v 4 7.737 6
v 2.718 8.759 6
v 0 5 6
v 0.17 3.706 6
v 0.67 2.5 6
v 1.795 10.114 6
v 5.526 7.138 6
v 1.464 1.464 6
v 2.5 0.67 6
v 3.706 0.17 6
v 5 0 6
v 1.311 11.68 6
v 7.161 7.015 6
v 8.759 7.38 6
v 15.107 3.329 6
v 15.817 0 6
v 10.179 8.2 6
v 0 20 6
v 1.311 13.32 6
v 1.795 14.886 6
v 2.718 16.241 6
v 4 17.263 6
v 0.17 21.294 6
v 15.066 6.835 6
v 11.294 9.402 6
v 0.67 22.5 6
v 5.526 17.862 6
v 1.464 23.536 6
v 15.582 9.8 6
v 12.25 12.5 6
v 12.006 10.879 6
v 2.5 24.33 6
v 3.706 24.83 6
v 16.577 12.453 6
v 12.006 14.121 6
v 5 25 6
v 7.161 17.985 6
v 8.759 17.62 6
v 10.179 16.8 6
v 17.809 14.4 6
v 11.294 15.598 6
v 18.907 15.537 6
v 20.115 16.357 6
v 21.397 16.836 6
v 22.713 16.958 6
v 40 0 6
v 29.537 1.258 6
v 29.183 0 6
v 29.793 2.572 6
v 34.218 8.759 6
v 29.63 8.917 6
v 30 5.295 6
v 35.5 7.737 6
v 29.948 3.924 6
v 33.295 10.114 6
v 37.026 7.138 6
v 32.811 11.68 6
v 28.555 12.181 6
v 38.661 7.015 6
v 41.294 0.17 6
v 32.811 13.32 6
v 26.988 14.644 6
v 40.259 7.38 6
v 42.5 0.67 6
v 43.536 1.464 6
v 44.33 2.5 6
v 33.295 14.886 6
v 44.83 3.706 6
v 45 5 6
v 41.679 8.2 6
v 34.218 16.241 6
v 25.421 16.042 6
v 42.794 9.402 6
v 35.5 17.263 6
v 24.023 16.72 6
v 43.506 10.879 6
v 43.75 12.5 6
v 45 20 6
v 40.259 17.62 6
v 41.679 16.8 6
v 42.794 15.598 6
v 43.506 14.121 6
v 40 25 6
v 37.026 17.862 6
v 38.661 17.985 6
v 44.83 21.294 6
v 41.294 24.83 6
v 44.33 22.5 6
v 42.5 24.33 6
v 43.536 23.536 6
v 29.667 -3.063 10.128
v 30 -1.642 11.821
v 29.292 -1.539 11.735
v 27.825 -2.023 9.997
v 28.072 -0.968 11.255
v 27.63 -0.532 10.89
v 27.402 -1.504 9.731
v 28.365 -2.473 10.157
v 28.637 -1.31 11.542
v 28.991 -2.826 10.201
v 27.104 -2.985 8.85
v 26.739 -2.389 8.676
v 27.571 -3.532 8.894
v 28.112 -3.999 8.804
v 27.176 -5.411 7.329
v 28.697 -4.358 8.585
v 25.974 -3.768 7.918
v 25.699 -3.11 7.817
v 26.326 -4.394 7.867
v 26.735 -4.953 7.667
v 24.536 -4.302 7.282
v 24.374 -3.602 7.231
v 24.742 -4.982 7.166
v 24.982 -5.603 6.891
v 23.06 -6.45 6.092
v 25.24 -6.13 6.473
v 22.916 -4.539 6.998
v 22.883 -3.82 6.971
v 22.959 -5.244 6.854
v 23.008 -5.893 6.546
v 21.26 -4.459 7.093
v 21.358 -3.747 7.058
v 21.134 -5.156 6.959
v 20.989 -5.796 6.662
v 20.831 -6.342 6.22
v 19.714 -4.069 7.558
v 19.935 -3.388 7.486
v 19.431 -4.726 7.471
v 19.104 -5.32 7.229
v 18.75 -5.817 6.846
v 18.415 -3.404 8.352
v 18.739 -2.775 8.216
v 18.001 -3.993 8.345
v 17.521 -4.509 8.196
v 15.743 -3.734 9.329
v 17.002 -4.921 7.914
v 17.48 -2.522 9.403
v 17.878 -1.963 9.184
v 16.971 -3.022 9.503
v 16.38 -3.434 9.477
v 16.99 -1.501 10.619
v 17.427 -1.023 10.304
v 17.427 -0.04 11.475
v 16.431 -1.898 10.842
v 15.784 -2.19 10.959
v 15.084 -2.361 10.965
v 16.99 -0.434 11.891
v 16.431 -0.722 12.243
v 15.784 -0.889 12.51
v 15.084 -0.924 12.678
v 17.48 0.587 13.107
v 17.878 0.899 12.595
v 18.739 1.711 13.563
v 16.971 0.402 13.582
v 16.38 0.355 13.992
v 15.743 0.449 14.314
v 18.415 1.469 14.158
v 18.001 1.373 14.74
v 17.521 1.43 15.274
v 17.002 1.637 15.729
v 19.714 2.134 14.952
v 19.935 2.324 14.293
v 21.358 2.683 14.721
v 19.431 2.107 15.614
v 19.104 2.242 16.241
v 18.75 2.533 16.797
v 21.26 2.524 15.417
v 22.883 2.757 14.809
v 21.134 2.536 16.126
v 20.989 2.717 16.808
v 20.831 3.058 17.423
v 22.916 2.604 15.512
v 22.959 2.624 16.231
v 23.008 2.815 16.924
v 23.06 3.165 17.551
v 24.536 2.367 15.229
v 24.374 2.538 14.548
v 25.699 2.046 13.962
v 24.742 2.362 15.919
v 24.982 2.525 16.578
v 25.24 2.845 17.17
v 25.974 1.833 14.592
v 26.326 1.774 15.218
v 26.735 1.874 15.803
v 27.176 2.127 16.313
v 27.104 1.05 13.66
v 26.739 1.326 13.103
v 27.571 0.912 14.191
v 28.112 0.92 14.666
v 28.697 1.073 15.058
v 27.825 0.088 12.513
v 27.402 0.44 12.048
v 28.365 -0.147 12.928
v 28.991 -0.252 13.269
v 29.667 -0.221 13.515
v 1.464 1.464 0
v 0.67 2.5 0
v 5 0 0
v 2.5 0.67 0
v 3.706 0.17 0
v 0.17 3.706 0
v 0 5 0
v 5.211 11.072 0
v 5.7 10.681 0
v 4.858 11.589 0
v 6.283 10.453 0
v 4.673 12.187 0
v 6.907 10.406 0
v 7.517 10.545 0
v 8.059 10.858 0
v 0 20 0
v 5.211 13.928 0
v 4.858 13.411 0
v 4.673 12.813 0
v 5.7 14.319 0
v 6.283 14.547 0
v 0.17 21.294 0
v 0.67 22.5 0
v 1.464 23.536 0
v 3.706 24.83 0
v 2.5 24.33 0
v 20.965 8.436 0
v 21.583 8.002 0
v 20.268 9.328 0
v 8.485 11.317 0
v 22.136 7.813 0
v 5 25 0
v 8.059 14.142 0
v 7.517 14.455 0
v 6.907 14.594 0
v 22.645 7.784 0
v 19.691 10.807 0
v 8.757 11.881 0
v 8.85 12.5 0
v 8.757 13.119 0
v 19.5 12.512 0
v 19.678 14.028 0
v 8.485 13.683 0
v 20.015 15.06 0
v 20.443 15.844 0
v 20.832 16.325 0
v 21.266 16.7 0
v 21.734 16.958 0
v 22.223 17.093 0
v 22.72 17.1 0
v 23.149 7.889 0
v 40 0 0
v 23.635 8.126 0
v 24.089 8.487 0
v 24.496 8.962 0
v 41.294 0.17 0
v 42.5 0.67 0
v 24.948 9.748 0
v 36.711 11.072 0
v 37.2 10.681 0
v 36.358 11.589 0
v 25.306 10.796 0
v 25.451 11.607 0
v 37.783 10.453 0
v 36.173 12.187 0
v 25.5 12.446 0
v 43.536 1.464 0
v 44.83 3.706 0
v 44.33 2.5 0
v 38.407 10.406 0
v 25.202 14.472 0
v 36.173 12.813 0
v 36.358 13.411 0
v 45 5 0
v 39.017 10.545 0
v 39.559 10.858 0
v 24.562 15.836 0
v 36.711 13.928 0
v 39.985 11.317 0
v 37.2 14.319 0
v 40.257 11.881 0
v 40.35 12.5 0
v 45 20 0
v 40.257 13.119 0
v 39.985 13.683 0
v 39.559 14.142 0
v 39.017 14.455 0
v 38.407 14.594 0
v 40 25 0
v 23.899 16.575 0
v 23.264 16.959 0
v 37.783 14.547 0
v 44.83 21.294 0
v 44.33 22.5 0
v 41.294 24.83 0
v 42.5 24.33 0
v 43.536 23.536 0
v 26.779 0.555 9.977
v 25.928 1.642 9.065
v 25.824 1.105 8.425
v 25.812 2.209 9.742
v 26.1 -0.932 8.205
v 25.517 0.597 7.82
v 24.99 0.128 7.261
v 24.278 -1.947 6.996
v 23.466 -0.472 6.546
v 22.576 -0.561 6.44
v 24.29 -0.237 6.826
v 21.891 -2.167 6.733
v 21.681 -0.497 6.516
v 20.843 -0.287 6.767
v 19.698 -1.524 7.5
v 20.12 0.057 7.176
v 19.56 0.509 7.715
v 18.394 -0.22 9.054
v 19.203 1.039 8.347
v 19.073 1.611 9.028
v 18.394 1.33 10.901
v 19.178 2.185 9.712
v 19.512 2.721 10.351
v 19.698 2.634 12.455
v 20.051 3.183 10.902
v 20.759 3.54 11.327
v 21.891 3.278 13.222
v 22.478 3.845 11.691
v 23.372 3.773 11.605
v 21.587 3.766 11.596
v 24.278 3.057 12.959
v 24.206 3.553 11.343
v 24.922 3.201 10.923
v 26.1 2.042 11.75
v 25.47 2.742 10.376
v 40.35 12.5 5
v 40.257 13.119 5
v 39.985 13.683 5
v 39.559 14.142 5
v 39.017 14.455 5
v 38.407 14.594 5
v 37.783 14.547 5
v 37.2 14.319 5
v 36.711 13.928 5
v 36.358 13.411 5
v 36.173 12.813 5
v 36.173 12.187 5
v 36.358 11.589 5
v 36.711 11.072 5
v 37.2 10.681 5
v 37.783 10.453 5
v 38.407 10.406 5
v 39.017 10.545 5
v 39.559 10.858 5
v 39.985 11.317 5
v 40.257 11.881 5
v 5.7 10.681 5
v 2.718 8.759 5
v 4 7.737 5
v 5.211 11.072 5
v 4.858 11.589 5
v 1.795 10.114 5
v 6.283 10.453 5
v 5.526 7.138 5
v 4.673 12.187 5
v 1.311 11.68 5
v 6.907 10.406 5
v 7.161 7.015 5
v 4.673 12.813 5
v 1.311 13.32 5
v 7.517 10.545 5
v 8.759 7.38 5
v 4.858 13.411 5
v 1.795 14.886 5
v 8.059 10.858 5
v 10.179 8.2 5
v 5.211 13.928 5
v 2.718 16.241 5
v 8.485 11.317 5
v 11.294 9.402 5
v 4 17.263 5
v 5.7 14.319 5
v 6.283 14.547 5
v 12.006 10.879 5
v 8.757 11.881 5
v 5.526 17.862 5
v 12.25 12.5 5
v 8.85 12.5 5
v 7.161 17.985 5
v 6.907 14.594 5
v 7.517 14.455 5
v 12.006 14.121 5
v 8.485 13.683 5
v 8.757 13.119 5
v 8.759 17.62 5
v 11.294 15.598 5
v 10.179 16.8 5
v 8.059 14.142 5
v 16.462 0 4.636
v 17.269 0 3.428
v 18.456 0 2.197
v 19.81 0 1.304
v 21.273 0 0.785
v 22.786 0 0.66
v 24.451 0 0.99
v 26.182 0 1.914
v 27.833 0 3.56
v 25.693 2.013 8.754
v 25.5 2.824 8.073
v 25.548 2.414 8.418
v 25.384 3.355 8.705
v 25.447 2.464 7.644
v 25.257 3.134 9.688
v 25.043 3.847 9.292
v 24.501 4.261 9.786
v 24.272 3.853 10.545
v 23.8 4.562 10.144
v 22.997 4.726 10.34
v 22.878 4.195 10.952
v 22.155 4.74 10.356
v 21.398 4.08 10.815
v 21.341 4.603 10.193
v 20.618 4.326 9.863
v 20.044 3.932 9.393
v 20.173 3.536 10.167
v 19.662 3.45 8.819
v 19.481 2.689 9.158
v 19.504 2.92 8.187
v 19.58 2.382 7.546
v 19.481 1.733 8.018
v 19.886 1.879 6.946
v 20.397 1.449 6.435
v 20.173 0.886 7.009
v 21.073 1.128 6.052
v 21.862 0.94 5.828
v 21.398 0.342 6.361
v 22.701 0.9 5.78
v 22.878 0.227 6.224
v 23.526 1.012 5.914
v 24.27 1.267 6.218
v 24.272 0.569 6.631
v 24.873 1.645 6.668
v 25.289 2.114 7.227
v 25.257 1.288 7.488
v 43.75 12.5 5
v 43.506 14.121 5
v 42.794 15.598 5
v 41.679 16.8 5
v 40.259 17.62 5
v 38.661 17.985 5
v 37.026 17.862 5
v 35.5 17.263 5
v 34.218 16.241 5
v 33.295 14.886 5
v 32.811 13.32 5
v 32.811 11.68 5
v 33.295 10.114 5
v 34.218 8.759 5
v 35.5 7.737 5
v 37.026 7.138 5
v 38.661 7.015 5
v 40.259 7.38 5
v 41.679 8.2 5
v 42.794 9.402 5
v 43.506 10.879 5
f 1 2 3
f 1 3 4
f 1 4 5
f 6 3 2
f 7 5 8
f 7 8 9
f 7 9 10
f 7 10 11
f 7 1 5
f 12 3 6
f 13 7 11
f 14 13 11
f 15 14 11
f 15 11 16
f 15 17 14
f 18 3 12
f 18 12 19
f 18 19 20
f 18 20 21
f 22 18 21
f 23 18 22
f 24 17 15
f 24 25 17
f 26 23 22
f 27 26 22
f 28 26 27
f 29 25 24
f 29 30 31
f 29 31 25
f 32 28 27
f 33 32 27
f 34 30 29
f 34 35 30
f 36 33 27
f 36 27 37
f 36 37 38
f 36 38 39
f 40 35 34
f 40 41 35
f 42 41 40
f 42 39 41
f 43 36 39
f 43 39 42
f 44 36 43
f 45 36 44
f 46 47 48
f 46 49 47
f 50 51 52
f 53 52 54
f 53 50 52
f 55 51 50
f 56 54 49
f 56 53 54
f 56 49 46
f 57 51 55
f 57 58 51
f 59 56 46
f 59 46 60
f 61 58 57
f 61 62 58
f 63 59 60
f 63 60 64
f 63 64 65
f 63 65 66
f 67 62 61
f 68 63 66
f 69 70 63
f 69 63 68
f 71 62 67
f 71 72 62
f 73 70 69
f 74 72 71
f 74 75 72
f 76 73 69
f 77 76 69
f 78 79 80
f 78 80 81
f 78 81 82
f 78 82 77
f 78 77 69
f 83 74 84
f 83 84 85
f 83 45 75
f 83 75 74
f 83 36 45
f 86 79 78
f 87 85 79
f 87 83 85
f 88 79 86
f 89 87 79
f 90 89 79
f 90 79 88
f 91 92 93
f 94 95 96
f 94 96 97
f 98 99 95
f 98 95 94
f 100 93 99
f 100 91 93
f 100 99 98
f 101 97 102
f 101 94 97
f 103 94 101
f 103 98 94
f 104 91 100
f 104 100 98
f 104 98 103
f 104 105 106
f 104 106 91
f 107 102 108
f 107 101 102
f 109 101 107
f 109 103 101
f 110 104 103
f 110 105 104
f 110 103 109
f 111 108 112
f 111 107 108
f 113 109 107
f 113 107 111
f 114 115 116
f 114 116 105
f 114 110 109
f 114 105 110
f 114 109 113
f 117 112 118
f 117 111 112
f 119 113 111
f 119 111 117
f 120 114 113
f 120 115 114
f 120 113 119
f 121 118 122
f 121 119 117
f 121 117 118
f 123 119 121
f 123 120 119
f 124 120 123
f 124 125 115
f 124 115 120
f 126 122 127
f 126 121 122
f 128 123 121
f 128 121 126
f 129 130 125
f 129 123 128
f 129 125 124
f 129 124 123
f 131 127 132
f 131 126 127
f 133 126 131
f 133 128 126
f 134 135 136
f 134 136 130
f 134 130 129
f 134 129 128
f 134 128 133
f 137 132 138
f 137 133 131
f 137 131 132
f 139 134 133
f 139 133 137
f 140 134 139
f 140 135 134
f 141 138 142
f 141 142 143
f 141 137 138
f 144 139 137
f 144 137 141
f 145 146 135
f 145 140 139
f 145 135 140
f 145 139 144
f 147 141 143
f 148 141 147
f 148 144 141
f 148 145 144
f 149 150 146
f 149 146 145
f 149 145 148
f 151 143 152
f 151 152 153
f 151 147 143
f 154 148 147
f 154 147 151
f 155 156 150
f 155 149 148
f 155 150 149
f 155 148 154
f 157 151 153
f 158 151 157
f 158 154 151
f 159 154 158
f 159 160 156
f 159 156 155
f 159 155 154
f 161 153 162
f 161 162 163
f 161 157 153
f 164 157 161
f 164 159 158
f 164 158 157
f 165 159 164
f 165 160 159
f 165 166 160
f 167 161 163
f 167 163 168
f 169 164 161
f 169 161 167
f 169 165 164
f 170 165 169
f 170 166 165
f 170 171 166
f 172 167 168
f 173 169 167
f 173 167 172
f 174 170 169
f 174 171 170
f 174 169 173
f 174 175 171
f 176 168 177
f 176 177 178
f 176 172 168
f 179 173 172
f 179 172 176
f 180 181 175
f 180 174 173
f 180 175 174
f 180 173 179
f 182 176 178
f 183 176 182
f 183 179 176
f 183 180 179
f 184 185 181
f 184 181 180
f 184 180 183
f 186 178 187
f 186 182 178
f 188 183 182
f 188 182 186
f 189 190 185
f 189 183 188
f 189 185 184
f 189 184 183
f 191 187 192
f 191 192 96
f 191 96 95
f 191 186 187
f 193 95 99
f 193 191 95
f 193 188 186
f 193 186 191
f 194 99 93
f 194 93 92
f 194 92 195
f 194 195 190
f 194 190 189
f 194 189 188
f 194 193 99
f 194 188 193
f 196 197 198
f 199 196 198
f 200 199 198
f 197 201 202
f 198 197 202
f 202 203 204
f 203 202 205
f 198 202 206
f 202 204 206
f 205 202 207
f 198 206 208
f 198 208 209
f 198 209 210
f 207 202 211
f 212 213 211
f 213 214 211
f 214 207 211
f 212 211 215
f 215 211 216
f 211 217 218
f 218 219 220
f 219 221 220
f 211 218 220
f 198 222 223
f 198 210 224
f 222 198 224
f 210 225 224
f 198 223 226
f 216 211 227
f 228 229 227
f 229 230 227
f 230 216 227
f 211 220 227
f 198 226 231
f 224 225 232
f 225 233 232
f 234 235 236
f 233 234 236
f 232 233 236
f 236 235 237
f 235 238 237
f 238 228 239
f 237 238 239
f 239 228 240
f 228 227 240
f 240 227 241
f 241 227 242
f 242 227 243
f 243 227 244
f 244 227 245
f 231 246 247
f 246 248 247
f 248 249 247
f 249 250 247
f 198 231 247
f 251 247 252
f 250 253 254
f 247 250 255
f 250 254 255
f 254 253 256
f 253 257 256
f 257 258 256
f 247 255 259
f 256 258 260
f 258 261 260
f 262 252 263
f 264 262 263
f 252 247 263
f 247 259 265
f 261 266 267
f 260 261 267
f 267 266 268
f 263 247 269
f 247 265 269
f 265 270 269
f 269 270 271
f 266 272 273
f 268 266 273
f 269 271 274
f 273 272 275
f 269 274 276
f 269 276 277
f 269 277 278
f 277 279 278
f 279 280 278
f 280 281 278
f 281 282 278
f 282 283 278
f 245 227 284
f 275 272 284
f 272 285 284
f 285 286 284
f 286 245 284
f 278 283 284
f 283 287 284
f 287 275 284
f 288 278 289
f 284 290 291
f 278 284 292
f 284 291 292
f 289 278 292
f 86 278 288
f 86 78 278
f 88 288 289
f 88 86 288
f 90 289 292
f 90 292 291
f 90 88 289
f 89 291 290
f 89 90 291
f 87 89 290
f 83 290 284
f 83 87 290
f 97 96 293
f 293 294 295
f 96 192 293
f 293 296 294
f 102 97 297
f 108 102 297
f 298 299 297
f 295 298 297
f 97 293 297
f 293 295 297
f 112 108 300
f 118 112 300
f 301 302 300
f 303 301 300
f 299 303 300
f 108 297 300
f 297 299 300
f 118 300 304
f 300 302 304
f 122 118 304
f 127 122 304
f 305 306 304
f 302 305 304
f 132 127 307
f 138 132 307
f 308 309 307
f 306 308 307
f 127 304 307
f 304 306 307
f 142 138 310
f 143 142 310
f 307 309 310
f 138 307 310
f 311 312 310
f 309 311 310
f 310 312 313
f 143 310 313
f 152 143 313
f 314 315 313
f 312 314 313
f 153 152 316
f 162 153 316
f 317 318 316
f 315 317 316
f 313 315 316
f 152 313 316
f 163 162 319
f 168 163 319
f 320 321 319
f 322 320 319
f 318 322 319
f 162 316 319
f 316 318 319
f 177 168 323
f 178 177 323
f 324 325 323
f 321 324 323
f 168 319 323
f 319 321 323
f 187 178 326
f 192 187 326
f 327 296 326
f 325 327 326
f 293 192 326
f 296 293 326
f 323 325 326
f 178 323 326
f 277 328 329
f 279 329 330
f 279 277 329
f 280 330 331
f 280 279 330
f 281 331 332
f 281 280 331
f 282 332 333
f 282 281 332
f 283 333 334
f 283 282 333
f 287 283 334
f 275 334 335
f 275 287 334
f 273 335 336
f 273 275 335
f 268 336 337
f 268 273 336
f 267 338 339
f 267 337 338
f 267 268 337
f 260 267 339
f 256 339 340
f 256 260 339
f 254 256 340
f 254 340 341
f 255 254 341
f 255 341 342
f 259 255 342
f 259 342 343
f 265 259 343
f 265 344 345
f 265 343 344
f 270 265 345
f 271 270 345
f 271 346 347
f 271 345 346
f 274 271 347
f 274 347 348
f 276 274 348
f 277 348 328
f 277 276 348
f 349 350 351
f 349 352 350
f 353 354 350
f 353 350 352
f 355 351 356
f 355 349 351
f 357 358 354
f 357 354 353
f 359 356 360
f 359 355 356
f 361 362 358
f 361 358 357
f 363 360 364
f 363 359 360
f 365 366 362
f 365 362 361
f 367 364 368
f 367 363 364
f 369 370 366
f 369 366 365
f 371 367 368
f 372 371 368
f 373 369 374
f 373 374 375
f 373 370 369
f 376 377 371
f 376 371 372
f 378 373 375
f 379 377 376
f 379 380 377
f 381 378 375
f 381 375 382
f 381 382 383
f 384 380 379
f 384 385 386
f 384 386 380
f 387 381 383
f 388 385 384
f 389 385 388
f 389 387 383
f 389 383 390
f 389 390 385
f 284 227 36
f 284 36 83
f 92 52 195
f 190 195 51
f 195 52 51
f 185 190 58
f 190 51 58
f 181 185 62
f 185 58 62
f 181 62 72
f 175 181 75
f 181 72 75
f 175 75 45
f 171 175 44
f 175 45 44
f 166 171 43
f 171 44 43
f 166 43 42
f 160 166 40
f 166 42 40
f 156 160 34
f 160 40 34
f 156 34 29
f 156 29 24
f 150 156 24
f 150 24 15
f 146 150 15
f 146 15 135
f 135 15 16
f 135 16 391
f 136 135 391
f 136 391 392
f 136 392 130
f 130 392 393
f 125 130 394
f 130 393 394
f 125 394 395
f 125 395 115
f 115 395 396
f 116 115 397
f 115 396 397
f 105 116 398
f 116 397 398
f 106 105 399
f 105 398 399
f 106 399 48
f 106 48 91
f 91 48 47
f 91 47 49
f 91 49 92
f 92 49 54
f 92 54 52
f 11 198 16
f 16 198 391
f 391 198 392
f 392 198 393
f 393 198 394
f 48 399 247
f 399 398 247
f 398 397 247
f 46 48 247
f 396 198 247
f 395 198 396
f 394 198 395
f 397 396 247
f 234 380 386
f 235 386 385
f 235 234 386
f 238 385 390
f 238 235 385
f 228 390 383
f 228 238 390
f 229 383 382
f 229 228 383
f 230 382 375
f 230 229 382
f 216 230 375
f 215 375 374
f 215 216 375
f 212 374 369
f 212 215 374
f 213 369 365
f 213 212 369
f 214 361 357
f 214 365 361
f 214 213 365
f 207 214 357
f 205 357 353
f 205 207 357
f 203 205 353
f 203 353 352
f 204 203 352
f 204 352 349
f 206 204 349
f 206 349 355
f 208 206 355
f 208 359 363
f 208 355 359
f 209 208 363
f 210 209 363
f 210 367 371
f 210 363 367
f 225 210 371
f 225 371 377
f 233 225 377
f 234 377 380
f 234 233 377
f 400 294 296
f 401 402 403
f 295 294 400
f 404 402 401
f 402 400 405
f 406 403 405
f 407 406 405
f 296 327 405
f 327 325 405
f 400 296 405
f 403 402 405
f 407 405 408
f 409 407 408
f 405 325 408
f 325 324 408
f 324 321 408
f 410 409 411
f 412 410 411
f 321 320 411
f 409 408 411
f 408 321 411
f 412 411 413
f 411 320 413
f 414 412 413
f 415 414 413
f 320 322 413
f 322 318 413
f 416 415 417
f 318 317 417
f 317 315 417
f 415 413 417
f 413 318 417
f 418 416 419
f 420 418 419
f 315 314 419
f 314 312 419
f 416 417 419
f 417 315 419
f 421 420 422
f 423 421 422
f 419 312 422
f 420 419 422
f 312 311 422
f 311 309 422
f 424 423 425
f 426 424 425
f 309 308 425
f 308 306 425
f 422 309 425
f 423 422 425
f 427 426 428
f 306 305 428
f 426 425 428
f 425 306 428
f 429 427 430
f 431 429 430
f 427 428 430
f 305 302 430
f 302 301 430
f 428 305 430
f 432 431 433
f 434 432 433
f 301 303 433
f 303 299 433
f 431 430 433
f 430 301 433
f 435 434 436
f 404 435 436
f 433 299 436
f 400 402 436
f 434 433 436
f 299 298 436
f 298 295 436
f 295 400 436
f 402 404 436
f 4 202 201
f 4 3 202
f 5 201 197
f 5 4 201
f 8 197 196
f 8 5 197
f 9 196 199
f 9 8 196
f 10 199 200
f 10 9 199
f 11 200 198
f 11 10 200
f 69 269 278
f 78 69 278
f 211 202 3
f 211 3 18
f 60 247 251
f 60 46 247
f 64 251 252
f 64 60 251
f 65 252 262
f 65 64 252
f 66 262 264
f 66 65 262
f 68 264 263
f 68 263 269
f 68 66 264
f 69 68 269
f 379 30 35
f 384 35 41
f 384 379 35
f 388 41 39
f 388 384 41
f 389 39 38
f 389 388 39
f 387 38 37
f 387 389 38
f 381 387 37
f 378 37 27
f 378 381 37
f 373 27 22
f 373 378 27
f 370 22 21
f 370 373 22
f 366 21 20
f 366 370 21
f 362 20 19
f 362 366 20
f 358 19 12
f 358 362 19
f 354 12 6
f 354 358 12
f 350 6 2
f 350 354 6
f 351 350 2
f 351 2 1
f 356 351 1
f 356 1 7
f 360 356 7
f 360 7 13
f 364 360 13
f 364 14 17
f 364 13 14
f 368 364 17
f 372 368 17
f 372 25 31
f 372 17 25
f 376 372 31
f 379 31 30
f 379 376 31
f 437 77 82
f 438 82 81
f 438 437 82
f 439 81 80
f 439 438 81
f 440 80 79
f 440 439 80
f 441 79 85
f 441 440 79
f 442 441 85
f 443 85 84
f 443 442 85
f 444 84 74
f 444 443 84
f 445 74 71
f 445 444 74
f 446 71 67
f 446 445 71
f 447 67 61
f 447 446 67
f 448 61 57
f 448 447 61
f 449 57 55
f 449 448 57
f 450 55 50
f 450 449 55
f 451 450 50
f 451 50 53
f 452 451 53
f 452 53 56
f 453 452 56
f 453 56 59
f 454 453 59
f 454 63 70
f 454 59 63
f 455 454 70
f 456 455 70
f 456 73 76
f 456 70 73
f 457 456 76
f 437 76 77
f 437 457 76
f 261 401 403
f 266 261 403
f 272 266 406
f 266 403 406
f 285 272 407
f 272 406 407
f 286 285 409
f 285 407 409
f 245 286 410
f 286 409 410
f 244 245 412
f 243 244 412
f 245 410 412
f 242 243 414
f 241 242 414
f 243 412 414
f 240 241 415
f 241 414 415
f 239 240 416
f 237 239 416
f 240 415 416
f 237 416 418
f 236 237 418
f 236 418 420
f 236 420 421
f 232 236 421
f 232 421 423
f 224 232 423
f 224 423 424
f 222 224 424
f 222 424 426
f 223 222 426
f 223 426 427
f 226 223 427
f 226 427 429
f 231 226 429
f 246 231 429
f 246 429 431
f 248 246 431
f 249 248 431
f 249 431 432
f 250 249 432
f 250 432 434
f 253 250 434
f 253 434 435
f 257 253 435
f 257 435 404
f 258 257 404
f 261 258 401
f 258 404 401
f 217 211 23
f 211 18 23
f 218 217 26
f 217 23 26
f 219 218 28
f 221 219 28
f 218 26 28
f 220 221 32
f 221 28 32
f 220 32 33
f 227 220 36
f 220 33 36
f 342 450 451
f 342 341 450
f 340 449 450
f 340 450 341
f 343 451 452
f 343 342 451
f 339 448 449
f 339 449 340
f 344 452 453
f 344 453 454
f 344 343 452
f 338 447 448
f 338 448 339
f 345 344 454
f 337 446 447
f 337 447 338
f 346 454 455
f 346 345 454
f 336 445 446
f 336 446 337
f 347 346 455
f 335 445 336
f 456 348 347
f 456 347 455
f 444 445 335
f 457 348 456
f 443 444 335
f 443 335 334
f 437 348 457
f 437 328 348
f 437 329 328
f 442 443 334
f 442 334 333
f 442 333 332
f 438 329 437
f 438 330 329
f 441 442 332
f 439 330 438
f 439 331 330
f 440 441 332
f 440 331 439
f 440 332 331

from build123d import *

# Parameters (mm, degrees)
F0_W           = 45
F0_H           = 25
F1_DEPTH       = 6
F2_R           = 5
F4_R           = 5.5
F5_DEPTH       = 25
F6_R           = 2.1
F7_DEPTH       = 25
F9_R           = 7.5
F10_DEPTH      = 5
F10_DEPTH_BACK = 25
F11_W          = 49.2877000943
F11_H          = 30.2235903218
F12_DEPTH      = 25
F13_W          = 37.6632460393
F13_H          = 10.6945014559
F14_DEPTH      = 25
F15_R          = 3
F16_DEPTH      = 25
F16_DEPTH_BACK = 25
F18_R          = 3


# Not quite as in the source:
# - a fillet or chamfer that OpenCascade refuses, or shapes differently, is made with other operations: its cross-section is extruded or revolved along the edge and cut away or added


with BuildPart() as f1:
    # F0 (on Top) → F1 (new body)
    with BuildSketch(Plane.XY):
        with Locations((22.5, 12.5)):
            Rectangle(F0_W, F0_H)
    extrude(amount=F1_DEPTH)

    # F2
    f2_edges = [f1.edges().sort_by_distance(p)[0] for p in [
        (45, 25, 3),
        (45, 0, 3),
        (0, 25, 3),
        (0, 0, 3),
    ]]
    fillet(f2_edges, radius=F2_R)

    # F4 (on offset) → F5 (cut)
    with BuildSketch(Plane.XY.offset(5)):
        with Locations((6.75, 12.5)):
            Circle(F4_R)
        with Locations((38.25, 12.5)):
            Circle(F4_R)
    extrude(amount=F5_DEPTH, mode=Mode.SUBTRACT)

    # F6 (on Top) → F7 (cut)
    with BuildSketch(Plane.XY):
        with Locations((6.75, 12.5)):
            Circle(F6_R)
        with Locations((38.25, 12.5)):
            Circle(F6_R)
    extrude(amount=F7_DEPTH, mode=Mode.SUBTRACT)

    # F9 (on face) → F10 (join, two sides)
    with BuildSketch(Plane(origin=(0, -2.954423259, 2.479055467), x_dir=(1, 0, 0), z_dir=(0, -0.7660444431, 0.6427876097))) as f10_sk:
        with Locations((22.5, 8)):
            Circle(F9_R)
    extrude(amount=F10_DEPTH)
    extrude(f10_sk.sketch, amount=-F10_DEPTH_BACK)

    # F11 (on Top) → F12 (cut)
    with BuildSketch(Plane.XY):
        with Locations((22.6797270589, 13.7661970221)):
            Rectangle(F11_W, F11_H)
    extrude(amount=-F12_DEPTH, mode=Mode.SUBTRACT)

    # F13 (on face) → F14 (cut)
    with BuildSketch(Plane(origin=(0, 25, 0), x_dir=(-1, 0, 0), z_dir=(0, 1, 0))):
        with Locations((-22.6992729586, 2.3689556401)):
            Rectangle(F13_W, F13_H)
    extrude(amount=F14_DEPTH, mode=Mode.SUBTRACT)

    # F15 (on face) → F16 (cut, two sides)
    with BuildSketch(Plane(origin=(0, -2.954423259, 2.479055467), x_dir=(1, 0, 0), z_dir=(0, -0.7660444431, 0.6427876097))) as f16_sk:
        with Locations((22.5, 8)):
            Circle(F15_R)
    extrude(amount=F16_DEPTH, mode=Mode.SUBTRACT)
    extrude(f16_sk.sketch, amount=-F16_DEPTH_BACK, mode=Mode.SUBTRACT)

    # F17: chamfer of 3 x 5 on 1 edges, made by hand

    # F17_s1 → F17_t2 (revolve, cut)
    with BuildSketch(Plane(origin=(0, 5.1423008775, 6.128355545), x_dir=(1, 0, 0), z_dir=(0, 0.6427876097, 0.7660444431))):
        Polygon((28.5, -8.8567256581), (25.5, -3.8567256581), (25.5, -8.8567256581), align=None)
    revolve(axis=Axis((22.5, -1.6423445971, 11.8213490604), (0, 0.7660444431, -0.6427876097)), mode=Mode.SUBTRACT)

    # F18
    f18_edges = [f1.edges().sort_by_distance(p)[0] for p in [
        (19.5, 2.187878, 8.607411),
    ]]
    fillet(f18_edges, radius=F18_R)

    # F19: fillet of radius 3 on 1 edges, made by hand

    # F19_s1 → F19_t2 (revolve, cut)
    with BuildSketch(Plane(origin=(0, 5.1423008775, 6.128355545), x_dir=(1, 0, 0), z_dir=(0, 0.6427876097, 0.7660444431))):
        with BuildLine():
            ThreePointArc((27.6302051352, -7.4070675501), (28.6371938466, -8.4227287465), (30, -8.8567256581))
            Line((30, -8.8567256581), (28.5, -8.8567256581))
            Line((28.5, -8.8567256581), (27.6302051352, -7.4070675501))
        make_face()
    revolve(axis=Axis((22.5, -1.6423445971, 11.8213490604), (0, 0.7660444431, -0.6427876097)), mode=Mode.SUBTRACT)


solid = f1.part
